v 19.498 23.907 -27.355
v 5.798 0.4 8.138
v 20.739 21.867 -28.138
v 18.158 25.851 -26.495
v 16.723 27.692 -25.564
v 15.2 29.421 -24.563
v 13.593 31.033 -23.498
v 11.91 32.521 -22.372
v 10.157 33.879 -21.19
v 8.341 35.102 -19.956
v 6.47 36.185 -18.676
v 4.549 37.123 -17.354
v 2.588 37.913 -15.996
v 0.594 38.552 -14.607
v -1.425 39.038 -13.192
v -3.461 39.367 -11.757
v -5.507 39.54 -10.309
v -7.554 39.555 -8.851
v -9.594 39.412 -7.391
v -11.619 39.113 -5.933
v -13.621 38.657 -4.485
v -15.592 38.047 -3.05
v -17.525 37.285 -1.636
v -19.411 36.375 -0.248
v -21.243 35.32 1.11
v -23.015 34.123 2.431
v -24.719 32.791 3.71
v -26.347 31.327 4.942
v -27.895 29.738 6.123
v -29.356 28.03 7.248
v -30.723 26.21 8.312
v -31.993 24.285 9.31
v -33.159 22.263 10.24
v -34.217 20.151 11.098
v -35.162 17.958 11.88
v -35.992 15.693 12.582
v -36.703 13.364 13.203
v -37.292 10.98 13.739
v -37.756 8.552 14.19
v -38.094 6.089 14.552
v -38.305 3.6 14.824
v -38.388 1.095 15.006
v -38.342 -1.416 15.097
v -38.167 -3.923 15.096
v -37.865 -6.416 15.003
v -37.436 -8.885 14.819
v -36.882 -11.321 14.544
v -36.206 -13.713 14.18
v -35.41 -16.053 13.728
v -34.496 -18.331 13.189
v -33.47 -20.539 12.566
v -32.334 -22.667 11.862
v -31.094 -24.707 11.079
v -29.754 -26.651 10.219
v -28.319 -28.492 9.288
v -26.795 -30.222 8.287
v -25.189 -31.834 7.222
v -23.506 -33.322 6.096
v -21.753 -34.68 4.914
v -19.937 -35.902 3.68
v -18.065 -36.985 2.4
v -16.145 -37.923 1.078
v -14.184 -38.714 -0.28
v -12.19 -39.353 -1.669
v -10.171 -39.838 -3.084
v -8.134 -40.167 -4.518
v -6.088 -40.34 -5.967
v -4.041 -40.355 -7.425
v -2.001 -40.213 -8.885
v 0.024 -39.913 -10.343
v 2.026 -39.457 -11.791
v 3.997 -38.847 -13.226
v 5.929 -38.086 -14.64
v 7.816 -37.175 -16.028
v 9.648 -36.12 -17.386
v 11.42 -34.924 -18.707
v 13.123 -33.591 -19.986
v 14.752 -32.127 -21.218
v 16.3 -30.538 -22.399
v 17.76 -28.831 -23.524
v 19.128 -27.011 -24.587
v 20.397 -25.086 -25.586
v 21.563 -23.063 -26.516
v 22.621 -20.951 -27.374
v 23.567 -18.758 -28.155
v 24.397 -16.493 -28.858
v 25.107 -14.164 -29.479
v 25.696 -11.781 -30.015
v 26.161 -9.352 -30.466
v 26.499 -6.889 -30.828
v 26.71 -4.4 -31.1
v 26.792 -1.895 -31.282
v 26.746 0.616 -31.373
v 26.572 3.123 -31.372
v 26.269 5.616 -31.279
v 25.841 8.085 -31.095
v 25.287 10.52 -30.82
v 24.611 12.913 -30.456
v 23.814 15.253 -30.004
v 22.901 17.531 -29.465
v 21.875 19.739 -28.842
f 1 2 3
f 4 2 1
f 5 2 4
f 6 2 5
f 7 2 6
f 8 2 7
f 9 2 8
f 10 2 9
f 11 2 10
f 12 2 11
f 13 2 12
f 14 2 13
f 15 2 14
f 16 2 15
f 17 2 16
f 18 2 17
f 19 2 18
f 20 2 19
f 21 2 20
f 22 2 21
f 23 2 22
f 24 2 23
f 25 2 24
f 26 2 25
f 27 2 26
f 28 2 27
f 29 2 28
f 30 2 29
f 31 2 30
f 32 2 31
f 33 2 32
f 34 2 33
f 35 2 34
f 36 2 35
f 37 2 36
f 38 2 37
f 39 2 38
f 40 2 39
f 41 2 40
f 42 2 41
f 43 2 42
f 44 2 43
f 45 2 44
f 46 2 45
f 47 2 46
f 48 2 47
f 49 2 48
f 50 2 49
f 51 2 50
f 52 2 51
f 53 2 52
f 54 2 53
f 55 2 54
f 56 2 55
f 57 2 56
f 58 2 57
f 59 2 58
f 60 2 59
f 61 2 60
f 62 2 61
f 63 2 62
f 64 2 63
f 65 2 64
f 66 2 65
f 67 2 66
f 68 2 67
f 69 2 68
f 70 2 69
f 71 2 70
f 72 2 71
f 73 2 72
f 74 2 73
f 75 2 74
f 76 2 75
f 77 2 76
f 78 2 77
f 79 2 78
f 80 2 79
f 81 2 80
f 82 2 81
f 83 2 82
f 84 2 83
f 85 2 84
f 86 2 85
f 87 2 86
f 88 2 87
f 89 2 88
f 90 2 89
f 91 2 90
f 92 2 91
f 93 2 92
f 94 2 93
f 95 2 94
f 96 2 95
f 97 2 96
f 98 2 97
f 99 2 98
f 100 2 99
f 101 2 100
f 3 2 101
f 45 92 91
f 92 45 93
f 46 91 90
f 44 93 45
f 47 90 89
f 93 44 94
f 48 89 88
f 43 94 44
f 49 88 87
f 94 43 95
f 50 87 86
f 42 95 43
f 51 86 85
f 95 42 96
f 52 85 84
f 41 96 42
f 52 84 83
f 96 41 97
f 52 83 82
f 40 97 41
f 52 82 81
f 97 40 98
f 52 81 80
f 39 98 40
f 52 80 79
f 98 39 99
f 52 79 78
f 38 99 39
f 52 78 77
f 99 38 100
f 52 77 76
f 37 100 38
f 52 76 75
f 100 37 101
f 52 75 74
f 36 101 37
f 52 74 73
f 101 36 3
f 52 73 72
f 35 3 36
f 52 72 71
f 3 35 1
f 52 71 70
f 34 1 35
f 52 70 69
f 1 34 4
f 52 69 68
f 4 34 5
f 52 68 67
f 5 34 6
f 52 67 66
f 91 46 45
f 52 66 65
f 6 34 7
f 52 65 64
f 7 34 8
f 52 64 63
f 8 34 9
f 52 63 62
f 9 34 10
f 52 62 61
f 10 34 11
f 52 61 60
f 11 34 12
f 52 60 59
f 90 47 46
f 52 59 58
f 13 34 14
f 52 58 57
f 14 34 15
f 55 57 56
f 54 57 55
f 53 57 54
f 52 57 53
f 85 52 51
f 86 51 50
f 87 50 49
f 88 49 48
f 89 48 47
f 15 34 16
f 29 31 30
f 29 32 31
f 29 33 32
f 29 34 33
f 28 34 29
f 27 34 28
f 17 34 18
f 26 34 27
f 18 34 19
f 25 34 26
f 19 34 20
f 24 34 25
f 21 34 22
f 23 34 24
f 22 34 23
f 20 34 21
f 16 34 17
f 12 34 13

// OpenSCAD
union() {
    rotate([20,30,40]) {
        difference() {
            cylinder(20,40,0,true,$fn=100);
            // cylinder(200,10,10,true,$fn=100);
        }
    }
}
